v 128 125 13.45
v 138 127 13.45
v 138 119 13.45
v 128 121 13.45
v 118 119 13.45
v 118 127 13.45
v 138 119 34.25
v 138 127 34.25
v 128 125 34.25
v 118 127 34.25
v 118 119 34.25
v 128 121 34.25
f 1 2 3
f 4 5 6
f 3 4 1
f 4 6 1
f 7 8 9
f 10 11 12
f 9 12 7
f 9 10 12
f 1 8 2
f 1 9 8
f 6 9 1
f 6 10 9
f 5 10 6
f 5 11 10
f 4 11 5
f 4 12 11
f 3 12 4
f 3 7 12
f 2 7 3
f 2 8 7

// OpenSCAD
// TailWatch S3 enclosure -- bowtie key #2 (top seam boss, s=1), ASSEMBLY position.
include <../tailwatch_lib.scad>
translate([seam_x, panel_h + C - boss_d/2 + 0.5, zf + 0.25]) bowtie_key();
